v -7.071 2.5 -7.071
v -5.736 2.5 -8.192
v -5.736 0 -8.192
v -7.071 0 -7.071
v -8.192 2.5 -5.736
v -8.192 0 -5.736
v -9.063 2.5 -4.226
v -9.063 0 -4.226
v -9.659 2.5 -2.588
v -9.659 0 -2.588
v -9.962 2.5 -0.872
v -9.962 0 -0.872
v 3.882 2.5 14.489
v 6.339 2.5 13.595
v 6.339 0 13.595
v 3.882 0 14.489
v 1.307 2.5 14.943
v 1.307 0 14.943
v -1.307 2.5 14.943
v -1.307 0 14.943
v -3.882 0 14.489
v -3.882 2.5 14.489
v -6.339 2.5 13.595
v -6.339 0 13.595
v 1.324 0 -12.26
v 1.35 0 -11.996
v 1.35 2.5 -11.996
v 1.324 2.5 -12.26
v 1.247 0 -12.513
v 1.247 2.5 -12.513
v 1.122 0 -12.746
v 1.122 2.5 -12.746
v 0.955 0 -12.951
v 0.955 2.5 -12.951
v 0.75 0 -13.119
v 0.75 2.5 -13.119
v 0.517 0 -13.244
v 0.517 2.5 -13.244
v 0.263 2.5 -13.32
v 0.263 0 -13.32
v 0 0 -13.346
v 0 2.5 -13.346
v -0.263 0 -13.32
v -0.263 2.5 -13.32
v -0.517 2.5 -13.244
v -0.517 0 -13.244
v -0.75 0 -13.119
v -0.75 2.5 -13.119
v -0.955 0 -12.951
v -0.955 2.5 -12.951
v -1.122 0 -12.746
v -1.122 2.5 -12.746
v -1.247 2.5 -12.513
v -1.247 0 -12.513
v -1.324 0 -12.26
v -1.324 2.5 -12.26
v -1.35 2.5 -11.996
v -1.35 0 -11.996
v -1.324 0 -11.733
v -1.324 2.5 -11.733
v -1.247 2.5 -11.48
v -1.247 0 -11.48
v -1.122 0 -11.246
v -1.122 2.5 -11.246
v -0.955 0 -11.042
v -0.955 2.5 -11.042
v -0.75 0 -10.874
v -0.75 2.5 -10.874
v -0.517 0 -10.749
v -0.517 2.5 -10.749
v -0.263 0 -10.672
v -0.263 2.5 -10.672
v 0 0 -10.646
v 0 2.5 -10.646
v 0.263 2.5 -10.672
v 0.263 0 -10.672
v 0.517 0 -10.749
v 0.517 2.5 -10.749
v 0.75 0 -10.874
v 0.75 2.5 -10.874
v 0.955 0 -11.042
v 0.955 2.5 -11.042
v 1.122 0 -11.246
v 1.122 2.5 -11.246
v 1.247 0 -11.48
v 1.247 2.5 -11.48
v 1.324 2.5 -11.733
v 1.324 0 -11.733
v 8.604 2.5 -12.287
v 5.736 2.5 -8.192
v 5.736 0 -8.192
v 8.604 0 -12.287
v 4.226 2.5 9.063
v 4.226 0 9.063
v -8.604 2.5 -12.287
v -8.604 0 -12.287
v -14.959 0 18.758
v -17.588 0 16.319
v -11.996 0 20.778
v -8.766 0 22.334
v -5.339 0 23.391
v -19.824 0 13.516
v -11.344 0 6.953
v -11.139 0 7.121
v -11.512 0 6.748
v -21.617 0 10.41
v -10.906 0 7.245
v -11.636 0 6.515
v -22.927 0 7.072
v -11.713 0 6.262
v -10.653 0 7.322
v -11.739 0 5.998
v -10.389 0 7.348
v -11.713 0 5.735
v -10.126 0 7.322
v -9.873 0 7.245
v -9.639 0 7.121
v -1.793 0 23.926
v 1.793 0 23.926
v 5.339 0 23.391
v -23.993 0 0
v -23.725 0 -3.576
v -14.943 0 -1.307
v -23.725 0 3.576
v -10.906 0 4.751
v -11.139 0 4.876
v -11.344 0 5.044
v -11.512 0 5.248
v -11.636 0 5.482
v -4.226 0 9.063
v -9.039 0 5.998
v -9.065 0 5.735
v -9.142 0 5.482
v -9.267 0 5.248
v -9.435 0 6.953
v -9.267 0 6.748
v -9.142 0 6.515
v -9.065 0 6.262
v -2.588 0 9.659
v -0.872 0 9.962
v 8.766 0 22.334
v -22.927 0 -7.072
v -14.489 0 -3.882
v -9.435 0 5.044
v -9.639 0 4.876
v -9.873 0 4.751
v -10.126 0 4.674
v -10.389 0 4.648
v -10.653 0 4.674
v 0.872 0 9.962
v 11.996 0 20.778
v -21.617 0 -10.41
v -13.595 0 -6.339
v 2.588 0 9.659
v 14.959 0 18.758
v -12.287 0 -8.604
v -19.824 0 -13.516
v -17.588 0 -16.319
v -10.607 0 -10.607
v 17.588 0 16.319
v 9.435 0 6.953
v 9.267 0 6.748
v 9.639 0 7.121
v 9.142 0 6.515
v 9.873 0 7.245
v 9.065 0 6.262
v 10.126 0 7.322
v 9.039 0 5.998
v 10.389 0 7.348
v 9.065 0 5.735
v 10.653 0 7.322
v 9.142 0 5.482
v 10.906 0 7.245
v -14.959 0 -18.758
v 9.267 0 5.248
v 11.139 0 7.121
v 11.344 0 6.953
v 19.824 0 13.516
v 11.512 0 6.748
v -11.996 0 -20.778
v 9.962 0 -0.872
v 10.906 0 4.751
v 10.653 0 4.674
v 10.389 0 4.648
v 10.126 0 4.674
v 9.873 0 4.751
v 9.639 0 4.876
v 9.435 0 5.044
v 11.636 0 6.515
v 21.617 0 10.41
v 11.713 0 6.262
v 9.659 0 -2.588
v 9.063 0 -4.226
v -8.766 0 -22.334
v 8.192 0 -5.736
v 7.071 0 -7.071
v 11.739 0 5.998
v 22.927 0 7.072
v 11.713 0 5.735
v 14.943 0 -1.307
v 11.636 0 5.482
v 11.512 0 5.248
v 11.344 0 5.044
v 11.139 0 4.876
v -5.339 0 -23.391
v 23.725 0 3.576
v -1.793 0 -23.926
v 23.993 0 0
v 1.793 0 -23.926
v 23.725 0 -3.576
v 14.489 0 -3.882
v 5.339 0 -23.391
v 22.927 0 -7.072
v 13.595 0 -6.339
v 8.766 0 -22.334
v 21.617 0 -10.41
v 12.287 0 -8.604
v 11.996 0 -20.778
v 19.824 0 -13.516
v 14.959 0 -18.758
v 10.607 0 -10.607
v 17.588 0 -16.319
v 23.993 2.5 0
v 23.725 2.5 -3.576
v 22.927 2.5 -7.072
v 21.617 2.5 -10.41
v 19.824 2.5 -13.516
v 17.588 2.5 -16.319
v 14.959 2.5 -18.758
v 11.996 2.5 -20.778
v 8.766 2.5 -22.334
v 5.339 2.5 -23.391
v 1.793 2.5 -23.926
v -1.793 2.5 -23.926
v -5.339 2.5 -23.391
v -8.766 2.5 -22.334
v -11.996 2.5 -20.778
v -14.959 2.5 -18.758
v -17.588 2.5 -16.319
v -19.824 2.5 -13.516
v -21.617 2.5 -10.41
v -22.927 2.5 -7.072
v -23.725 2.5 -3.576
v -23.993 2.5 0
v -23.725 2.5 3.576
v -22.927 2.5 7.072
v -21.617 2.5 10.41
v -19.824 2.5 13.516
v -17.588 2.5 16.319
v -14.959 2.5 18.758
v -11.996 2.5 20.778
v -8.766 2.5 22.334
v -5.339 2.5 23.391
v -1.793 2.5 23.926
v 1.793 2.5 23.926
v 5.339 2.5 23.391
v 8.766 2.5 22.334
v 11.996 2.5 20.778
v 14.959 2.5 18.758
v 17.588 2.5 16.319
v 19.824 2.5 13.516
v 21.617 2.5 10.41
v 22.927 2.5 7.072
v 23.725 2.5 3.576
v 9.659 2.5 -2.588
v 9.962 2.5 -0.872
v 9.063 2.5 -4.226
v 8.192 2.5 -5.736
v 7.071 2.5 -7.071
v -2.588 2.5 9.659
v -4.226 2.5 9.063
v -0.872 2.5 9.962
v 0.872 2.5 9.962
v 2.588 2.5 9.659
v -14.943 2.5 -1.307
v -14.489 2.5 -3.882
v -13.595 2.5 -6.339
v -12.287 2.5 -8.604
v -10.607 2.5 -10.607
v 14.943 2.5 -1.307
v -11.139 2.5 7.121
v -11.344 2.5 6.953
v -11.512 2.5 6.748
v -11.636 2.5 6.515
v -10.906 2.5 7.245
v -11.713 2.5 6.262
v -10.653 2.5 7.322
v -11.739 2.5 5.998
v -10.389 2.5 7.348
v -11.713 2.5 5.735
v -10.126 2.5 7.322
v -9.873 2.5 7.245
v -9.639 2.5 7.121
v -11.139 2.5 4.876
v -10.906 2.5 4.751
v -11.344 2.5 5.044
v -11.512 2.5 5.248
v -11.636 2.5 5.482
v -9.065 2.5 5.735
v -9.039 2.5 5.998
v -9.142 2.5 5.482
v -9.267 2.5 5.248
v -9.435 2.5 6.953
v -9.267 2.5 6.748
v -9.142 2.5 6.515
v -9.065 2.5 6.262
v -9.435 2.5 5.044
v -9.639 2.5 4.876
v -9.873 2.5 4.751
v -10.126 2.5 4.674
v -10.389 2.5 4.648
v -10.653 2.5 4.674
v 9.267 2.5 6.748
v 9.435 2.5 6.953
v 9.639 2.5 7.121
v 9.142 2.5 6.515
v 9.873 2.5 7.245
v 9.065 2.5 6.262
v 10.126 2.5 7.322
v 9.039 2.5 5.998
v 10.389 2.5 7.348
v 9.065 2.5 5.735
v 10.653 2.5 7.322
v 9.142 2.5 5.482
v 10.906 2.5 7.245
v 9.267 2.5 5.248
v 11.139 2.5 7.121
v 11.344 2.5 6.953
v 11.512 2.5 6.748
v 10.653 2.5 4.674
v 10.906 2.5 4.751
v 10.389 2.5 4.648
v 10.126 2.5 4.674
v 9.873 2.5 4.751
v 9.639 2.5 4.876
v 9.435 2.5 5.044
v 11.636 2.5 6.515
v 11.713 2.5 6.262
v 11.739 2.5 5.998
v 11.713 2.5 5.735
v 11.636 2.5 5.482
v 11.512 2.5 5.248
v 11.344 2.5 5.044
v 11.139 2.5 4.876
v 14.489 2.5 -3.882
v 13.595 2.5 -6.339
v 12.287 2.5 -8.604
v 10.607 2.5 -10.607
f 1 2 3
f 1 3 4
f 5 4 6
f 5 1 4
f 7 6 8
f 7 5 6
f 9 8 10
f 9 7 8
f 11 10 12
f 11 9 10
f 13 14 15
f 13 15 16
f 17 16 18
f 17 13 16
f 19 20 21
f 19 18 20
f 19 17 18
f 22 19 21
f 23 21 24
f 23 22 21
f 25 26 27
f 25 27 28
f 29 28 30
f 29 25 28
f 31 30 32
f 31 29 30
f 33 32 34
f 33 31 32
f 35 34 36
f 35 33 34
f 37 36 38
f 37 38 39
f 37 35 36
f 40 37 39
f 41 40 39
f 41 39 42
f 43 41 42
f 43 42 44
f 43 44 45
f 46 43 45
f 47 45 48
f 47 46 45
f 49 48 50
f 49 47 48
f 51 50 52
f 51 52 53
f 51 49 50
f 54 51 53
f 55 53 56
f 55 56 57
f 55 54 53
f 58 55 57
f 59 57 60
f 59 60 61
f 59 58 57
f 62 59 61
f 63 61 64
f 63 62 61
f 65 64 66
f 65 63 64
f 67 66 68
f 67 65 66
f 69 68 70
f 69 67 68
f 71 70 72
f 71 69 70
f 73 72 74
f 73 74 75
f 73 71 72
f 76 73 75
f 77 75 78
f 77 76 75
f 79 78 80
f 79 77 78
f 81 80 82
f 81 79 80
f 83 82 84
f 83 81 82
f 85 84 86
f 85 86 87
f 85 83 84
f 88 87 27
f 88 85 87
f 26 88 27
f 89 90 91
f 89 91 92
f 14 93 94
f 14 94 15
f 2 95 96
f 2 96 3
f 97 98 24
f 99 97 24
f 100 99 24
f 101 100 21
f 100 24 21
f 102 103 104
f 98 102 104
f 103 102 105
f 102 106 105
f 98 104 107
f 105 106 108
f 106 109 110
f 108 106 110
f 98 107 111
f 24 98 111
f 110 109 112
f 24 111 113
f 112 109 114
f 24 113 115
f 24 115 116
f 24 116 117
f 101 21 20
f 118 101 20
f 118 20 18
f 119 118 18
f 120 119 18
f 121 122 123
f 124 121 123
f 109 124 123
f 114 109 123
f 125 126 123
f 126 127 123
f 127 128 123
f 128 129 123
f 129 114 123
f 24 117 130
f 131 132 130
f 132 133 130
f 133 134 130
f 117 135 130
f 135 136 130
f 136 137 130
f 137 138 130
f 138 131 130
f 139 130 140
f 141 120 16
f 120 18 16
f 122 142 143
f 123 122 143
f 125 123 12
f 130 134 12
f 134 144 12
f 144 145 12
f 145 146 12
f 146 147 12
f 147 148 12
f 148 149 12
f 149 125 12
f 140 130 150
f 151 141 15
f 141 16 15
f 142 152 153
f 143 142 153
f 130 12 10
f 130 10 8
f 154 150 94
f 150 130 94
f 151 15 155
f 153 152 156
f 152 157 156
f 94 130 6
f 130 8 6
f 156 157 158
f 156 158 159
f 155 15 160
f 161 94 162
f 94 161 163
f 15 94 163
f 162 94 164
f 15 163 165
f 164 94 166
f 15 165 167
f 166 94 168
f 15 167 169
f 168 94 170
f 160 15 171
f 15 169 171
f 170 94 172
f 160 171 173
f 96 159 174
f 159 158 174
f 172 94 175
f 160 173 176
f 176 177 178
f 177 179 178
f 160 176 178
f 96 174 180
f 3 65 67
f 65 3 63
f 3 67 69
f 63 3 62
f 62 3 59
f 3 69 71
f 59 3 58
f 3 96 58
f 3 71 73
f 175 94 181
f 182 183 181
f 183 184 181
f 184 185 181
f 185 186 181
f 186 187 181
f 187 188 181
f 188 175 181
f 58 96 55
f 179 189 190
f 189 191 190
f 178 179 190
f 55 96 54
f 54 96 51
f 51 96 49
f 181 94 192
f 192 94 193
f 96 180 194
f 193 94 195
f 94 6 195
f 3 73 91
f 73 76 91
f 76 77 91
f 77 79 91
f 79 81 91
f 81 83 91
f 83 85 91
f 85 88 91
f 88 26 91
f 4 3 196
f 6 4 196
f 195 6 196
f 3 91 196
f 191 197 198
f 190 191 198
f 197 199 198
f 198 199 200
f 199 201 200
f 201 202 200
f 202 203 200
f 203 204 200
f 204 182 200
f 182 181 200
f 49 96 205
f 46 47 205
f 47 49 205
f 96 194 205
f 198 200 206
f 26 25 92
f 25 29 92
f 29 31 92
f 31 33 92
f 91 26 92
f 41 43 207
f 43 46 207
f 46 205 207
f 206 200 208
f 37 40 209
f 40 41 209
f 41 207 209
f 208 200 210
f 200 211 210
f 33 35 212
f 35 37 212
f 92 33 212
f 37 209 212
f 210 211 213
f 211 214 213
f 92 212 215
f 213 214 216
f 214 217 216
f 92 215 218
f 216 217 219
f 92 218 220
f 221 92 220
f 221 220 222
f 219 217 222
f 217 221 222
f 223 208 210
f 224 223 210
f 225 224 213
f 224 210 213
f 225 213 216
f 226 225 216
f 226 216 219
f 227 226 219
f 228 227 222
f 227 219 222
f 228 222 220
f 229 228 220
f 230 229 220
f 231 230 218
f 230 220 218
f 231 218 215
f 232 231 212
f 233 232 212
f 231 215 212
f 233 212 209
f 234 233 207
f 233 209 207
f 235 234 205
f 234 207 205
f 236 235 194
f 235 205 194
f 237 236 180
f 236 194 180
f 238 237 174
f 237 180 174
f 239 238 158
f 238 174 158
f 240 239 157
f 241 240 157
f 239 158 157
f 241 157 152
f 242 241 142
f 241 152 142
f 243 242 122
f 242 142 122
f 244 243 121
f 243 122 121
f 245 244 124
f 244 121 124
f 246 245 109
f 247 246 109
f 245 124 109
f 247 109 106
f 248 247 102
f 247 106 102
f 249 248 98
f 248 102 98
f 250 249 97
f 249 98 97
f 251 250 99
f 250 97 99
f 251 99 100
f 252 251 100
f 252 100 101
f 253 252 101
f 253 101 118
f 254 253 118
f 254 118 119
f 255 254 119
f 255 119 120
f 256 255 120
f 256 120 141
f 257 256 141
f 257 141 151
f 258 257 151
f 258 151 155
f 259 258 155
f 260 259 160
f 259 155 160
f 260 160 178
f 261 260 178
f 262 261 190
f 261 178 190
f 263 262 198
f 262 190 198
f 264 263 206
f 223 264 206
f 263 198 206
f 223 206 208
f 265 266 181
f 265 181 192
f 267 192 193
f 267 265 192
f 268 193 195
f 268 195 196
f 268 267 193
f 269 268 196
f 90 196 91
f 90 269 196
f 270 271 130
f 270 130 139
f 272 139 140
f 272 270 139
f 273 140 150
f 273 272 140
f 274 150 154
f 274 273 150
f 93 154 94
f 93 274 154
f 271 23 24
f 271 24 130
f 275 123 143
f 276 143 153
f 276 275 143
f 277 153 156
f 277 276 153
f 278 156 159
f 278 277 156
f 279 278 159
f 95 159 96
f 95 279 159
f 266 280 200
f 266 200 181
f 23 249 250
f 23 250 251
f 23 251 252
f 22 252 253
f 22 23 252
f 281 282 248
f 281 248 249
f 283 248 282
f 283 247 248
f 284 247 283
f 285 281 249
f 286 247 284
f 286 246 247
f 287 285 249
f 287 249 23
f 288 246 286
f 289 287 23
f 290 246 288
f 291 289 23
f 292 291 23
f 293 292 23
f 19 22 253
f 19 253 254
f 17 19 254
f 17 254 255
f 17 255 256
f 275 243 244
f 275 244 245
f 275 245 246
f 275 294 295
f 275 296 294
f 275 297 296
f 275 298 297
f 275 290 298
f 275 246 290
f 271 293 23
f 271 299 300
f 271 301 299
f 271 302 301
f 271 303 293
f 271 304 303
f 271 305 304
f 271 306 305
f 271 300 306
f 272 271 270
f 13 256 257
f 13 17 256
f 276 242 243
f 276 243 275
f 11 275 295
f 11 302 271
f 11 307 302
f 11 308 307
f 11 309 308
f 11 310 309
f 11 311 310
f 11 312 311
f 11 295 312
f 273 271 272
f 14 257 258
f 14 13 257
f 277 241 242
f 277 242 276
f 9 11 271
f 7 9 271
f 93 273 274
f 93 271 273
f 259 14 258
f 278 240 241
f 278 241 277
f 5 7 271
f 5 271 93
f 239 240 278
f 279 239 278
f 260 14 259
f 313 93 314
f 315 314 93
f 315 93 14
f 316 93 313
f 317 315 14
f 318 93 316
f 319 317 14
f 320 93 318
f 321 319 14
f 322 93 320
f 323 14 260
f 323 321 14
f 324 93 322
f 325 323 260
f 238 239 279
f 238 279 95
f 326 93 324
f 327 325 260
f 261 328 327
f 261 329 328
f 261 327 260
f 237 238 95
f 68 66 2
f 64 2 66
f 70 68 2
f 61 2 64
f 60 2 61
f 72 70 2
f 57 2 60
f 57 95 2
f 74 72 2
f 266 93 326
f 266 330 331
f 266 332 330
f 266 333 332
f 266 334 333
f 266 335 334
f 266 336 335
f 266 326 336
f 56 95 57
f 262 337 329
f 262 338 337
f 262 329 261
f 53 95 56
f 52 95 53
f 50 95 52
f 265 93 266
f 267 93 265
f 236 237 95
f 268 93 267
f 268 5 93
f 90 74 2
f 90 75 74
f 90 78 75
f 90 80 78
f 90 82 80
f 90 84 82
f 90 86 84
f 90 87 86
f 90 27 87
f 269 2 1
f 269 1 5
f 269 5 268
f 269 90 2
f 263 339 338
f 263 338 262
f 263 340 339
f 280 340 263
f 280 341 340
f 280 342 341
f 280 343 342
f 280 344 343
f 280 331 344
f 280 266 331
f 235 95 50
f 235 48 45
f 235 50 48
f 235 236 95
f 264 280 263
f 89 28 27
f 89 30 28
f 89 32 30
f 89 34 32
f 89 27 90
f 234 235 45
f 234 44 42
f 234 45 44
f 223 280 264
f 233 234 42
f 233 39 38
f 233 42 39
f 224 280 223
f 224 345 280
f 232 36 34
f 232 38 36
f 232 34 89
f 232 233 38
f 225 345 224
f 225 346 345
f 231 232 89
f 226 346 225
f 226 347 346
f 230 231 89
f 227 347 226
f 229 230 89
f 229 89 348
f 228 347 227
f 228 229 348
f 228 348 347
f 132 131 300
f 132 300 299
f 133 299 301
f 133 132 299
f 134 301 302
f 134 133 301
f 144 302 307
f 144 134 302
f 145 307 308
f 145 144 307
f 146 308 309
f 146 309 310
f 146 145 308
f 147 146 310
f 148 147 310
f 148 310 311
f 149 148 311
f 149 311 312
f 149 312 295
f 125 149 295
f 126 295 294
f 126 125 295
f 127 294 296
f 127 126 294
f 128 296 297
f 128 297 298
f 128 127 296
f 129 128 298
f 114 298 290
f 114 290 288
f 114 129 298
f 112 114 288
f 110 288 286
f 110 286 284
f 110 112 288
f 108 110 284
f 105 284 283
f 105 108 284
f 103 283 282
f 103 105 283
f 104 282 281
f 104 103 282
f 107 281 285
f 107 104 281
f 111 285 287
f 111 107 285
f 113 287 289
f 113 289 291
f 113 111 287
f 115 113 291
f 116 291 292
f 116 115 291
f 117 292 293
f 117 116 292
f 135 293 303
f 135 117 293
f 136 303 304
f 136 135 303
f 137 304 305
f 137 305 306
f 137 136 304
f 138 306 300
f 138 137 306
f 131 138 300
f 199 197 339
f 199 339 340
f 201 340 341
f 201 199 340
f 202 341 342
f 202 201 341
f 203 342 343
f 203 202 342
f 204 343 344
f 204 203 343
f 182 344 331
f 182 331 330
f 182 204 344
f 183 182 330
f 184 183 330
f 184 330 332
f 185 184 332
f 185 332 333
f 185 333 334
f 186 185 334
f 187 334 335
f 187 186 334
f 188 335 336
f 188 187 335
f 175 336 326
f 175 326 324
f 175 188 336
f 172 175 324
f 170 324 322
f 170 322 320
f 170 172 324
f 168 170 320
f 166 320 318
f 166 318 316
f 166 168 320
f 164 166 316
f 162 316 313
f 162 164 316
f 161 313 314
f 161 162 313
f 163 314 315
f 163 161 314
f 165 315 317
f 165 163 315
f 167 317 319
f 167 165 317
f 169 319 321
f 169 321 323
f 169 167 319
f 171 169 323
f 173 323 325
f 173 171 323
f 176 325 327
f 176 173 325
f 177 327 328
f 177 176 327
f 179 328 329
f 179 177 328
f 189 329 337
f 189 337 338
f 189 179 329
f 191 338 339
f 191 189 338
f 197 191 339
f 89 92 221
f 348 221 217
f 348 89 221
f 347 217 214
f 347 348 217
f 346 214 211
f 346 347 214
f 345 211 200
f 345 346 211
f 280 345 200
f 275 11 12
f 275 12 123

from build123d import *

# Parameters (mm, degrees)
SKETCH1_R           = 23.99268
SKETCH1_R_2         = 1.35
BOSS_EXTRUDE1_DEPTH = 2.5
CUT_EXTRUDE2_DEPTH  = 10


with BuildPart() as part:
    # Sketch1 → Boss-Extrude1 (new body)
    with BuildSketch(Plane(origin=(0, 0, 0), x_dir=(1, 0, 0), z_dir=(0, 1, 0))):
        Circle(SKETCH1_R)
        with Locations((0, 11.99634)):
            Circle(SKETCH1_R_2, mode=Mode.SUBTRACT)
        with Locations((10.389135192, -5.99817)):
            Circle(SKETCH1_R_2, mode=Mode.SUBTRACT)
        with Locations((-10.389135192, -5.99817)):
            Circle(SKETCH1_R_2, mode=Mode.SUBTRACT)
    extrude(amount=BOSS_EXTRUDE1_DEPTH)

    # Sketch3 → Cut-Extrude2 (cut)
    with BuildSketch(Plane(origin=(0, 2.5, 0), x_dir=(1, 0, 0), z_dir=(0, 1, 0))):
        with BuildLine():
            Line((5.735764364, 8.191520443), (8.603646545, 12.287280664))
            ThreePointArc((8.603646545, 12.287280664), (12.990381057, 7.5), (14.942920471, 1.307336141))
            Line((14.942920471, 1.307336141), (9.961946981, 0.871557427))
            ThreePointArc((9.961946981, 0.871557427), (8.660254038, 5), (5.735764364, 8.191520443))
        make_face()
        with BuildLine():
            Line((4.226182617, -9.06307787), (6.339273926, -13.594616806))
            ThreePointArc((6.339273926, -13.594616806), (0, -15), (-6.339273926, -13.594616806))
            Line((-6.339273926, -13.594616806), (-4.226182617, -9.06307787))
            ThreePointArc((-4.226182617, -9.06307787), (0, -10), (4.226182617, -9.06307787))
        make_face()
        with BuildLine():
            Line((-9.961946981, 0.871557427), (-14.942920471, 1.307336141))
            ThreePointArc((-14.942920471, 1.307336141), (-12.990381057, 7.5), (-8.603646545, 12.287280664))
            Line((-8.603646545, 12.287280664), (-5.735764364, 8.191520443))
            ThreePointArc((-5.735764364, 8.191520443), (-8.660254038, 5), (-9.961946981, 0.871557427))
        make_face()
    extrude(amount=-CUT_EXTRUDE2_DEPTH, mode=Mode.SUBTRACT)


solid = part.part
